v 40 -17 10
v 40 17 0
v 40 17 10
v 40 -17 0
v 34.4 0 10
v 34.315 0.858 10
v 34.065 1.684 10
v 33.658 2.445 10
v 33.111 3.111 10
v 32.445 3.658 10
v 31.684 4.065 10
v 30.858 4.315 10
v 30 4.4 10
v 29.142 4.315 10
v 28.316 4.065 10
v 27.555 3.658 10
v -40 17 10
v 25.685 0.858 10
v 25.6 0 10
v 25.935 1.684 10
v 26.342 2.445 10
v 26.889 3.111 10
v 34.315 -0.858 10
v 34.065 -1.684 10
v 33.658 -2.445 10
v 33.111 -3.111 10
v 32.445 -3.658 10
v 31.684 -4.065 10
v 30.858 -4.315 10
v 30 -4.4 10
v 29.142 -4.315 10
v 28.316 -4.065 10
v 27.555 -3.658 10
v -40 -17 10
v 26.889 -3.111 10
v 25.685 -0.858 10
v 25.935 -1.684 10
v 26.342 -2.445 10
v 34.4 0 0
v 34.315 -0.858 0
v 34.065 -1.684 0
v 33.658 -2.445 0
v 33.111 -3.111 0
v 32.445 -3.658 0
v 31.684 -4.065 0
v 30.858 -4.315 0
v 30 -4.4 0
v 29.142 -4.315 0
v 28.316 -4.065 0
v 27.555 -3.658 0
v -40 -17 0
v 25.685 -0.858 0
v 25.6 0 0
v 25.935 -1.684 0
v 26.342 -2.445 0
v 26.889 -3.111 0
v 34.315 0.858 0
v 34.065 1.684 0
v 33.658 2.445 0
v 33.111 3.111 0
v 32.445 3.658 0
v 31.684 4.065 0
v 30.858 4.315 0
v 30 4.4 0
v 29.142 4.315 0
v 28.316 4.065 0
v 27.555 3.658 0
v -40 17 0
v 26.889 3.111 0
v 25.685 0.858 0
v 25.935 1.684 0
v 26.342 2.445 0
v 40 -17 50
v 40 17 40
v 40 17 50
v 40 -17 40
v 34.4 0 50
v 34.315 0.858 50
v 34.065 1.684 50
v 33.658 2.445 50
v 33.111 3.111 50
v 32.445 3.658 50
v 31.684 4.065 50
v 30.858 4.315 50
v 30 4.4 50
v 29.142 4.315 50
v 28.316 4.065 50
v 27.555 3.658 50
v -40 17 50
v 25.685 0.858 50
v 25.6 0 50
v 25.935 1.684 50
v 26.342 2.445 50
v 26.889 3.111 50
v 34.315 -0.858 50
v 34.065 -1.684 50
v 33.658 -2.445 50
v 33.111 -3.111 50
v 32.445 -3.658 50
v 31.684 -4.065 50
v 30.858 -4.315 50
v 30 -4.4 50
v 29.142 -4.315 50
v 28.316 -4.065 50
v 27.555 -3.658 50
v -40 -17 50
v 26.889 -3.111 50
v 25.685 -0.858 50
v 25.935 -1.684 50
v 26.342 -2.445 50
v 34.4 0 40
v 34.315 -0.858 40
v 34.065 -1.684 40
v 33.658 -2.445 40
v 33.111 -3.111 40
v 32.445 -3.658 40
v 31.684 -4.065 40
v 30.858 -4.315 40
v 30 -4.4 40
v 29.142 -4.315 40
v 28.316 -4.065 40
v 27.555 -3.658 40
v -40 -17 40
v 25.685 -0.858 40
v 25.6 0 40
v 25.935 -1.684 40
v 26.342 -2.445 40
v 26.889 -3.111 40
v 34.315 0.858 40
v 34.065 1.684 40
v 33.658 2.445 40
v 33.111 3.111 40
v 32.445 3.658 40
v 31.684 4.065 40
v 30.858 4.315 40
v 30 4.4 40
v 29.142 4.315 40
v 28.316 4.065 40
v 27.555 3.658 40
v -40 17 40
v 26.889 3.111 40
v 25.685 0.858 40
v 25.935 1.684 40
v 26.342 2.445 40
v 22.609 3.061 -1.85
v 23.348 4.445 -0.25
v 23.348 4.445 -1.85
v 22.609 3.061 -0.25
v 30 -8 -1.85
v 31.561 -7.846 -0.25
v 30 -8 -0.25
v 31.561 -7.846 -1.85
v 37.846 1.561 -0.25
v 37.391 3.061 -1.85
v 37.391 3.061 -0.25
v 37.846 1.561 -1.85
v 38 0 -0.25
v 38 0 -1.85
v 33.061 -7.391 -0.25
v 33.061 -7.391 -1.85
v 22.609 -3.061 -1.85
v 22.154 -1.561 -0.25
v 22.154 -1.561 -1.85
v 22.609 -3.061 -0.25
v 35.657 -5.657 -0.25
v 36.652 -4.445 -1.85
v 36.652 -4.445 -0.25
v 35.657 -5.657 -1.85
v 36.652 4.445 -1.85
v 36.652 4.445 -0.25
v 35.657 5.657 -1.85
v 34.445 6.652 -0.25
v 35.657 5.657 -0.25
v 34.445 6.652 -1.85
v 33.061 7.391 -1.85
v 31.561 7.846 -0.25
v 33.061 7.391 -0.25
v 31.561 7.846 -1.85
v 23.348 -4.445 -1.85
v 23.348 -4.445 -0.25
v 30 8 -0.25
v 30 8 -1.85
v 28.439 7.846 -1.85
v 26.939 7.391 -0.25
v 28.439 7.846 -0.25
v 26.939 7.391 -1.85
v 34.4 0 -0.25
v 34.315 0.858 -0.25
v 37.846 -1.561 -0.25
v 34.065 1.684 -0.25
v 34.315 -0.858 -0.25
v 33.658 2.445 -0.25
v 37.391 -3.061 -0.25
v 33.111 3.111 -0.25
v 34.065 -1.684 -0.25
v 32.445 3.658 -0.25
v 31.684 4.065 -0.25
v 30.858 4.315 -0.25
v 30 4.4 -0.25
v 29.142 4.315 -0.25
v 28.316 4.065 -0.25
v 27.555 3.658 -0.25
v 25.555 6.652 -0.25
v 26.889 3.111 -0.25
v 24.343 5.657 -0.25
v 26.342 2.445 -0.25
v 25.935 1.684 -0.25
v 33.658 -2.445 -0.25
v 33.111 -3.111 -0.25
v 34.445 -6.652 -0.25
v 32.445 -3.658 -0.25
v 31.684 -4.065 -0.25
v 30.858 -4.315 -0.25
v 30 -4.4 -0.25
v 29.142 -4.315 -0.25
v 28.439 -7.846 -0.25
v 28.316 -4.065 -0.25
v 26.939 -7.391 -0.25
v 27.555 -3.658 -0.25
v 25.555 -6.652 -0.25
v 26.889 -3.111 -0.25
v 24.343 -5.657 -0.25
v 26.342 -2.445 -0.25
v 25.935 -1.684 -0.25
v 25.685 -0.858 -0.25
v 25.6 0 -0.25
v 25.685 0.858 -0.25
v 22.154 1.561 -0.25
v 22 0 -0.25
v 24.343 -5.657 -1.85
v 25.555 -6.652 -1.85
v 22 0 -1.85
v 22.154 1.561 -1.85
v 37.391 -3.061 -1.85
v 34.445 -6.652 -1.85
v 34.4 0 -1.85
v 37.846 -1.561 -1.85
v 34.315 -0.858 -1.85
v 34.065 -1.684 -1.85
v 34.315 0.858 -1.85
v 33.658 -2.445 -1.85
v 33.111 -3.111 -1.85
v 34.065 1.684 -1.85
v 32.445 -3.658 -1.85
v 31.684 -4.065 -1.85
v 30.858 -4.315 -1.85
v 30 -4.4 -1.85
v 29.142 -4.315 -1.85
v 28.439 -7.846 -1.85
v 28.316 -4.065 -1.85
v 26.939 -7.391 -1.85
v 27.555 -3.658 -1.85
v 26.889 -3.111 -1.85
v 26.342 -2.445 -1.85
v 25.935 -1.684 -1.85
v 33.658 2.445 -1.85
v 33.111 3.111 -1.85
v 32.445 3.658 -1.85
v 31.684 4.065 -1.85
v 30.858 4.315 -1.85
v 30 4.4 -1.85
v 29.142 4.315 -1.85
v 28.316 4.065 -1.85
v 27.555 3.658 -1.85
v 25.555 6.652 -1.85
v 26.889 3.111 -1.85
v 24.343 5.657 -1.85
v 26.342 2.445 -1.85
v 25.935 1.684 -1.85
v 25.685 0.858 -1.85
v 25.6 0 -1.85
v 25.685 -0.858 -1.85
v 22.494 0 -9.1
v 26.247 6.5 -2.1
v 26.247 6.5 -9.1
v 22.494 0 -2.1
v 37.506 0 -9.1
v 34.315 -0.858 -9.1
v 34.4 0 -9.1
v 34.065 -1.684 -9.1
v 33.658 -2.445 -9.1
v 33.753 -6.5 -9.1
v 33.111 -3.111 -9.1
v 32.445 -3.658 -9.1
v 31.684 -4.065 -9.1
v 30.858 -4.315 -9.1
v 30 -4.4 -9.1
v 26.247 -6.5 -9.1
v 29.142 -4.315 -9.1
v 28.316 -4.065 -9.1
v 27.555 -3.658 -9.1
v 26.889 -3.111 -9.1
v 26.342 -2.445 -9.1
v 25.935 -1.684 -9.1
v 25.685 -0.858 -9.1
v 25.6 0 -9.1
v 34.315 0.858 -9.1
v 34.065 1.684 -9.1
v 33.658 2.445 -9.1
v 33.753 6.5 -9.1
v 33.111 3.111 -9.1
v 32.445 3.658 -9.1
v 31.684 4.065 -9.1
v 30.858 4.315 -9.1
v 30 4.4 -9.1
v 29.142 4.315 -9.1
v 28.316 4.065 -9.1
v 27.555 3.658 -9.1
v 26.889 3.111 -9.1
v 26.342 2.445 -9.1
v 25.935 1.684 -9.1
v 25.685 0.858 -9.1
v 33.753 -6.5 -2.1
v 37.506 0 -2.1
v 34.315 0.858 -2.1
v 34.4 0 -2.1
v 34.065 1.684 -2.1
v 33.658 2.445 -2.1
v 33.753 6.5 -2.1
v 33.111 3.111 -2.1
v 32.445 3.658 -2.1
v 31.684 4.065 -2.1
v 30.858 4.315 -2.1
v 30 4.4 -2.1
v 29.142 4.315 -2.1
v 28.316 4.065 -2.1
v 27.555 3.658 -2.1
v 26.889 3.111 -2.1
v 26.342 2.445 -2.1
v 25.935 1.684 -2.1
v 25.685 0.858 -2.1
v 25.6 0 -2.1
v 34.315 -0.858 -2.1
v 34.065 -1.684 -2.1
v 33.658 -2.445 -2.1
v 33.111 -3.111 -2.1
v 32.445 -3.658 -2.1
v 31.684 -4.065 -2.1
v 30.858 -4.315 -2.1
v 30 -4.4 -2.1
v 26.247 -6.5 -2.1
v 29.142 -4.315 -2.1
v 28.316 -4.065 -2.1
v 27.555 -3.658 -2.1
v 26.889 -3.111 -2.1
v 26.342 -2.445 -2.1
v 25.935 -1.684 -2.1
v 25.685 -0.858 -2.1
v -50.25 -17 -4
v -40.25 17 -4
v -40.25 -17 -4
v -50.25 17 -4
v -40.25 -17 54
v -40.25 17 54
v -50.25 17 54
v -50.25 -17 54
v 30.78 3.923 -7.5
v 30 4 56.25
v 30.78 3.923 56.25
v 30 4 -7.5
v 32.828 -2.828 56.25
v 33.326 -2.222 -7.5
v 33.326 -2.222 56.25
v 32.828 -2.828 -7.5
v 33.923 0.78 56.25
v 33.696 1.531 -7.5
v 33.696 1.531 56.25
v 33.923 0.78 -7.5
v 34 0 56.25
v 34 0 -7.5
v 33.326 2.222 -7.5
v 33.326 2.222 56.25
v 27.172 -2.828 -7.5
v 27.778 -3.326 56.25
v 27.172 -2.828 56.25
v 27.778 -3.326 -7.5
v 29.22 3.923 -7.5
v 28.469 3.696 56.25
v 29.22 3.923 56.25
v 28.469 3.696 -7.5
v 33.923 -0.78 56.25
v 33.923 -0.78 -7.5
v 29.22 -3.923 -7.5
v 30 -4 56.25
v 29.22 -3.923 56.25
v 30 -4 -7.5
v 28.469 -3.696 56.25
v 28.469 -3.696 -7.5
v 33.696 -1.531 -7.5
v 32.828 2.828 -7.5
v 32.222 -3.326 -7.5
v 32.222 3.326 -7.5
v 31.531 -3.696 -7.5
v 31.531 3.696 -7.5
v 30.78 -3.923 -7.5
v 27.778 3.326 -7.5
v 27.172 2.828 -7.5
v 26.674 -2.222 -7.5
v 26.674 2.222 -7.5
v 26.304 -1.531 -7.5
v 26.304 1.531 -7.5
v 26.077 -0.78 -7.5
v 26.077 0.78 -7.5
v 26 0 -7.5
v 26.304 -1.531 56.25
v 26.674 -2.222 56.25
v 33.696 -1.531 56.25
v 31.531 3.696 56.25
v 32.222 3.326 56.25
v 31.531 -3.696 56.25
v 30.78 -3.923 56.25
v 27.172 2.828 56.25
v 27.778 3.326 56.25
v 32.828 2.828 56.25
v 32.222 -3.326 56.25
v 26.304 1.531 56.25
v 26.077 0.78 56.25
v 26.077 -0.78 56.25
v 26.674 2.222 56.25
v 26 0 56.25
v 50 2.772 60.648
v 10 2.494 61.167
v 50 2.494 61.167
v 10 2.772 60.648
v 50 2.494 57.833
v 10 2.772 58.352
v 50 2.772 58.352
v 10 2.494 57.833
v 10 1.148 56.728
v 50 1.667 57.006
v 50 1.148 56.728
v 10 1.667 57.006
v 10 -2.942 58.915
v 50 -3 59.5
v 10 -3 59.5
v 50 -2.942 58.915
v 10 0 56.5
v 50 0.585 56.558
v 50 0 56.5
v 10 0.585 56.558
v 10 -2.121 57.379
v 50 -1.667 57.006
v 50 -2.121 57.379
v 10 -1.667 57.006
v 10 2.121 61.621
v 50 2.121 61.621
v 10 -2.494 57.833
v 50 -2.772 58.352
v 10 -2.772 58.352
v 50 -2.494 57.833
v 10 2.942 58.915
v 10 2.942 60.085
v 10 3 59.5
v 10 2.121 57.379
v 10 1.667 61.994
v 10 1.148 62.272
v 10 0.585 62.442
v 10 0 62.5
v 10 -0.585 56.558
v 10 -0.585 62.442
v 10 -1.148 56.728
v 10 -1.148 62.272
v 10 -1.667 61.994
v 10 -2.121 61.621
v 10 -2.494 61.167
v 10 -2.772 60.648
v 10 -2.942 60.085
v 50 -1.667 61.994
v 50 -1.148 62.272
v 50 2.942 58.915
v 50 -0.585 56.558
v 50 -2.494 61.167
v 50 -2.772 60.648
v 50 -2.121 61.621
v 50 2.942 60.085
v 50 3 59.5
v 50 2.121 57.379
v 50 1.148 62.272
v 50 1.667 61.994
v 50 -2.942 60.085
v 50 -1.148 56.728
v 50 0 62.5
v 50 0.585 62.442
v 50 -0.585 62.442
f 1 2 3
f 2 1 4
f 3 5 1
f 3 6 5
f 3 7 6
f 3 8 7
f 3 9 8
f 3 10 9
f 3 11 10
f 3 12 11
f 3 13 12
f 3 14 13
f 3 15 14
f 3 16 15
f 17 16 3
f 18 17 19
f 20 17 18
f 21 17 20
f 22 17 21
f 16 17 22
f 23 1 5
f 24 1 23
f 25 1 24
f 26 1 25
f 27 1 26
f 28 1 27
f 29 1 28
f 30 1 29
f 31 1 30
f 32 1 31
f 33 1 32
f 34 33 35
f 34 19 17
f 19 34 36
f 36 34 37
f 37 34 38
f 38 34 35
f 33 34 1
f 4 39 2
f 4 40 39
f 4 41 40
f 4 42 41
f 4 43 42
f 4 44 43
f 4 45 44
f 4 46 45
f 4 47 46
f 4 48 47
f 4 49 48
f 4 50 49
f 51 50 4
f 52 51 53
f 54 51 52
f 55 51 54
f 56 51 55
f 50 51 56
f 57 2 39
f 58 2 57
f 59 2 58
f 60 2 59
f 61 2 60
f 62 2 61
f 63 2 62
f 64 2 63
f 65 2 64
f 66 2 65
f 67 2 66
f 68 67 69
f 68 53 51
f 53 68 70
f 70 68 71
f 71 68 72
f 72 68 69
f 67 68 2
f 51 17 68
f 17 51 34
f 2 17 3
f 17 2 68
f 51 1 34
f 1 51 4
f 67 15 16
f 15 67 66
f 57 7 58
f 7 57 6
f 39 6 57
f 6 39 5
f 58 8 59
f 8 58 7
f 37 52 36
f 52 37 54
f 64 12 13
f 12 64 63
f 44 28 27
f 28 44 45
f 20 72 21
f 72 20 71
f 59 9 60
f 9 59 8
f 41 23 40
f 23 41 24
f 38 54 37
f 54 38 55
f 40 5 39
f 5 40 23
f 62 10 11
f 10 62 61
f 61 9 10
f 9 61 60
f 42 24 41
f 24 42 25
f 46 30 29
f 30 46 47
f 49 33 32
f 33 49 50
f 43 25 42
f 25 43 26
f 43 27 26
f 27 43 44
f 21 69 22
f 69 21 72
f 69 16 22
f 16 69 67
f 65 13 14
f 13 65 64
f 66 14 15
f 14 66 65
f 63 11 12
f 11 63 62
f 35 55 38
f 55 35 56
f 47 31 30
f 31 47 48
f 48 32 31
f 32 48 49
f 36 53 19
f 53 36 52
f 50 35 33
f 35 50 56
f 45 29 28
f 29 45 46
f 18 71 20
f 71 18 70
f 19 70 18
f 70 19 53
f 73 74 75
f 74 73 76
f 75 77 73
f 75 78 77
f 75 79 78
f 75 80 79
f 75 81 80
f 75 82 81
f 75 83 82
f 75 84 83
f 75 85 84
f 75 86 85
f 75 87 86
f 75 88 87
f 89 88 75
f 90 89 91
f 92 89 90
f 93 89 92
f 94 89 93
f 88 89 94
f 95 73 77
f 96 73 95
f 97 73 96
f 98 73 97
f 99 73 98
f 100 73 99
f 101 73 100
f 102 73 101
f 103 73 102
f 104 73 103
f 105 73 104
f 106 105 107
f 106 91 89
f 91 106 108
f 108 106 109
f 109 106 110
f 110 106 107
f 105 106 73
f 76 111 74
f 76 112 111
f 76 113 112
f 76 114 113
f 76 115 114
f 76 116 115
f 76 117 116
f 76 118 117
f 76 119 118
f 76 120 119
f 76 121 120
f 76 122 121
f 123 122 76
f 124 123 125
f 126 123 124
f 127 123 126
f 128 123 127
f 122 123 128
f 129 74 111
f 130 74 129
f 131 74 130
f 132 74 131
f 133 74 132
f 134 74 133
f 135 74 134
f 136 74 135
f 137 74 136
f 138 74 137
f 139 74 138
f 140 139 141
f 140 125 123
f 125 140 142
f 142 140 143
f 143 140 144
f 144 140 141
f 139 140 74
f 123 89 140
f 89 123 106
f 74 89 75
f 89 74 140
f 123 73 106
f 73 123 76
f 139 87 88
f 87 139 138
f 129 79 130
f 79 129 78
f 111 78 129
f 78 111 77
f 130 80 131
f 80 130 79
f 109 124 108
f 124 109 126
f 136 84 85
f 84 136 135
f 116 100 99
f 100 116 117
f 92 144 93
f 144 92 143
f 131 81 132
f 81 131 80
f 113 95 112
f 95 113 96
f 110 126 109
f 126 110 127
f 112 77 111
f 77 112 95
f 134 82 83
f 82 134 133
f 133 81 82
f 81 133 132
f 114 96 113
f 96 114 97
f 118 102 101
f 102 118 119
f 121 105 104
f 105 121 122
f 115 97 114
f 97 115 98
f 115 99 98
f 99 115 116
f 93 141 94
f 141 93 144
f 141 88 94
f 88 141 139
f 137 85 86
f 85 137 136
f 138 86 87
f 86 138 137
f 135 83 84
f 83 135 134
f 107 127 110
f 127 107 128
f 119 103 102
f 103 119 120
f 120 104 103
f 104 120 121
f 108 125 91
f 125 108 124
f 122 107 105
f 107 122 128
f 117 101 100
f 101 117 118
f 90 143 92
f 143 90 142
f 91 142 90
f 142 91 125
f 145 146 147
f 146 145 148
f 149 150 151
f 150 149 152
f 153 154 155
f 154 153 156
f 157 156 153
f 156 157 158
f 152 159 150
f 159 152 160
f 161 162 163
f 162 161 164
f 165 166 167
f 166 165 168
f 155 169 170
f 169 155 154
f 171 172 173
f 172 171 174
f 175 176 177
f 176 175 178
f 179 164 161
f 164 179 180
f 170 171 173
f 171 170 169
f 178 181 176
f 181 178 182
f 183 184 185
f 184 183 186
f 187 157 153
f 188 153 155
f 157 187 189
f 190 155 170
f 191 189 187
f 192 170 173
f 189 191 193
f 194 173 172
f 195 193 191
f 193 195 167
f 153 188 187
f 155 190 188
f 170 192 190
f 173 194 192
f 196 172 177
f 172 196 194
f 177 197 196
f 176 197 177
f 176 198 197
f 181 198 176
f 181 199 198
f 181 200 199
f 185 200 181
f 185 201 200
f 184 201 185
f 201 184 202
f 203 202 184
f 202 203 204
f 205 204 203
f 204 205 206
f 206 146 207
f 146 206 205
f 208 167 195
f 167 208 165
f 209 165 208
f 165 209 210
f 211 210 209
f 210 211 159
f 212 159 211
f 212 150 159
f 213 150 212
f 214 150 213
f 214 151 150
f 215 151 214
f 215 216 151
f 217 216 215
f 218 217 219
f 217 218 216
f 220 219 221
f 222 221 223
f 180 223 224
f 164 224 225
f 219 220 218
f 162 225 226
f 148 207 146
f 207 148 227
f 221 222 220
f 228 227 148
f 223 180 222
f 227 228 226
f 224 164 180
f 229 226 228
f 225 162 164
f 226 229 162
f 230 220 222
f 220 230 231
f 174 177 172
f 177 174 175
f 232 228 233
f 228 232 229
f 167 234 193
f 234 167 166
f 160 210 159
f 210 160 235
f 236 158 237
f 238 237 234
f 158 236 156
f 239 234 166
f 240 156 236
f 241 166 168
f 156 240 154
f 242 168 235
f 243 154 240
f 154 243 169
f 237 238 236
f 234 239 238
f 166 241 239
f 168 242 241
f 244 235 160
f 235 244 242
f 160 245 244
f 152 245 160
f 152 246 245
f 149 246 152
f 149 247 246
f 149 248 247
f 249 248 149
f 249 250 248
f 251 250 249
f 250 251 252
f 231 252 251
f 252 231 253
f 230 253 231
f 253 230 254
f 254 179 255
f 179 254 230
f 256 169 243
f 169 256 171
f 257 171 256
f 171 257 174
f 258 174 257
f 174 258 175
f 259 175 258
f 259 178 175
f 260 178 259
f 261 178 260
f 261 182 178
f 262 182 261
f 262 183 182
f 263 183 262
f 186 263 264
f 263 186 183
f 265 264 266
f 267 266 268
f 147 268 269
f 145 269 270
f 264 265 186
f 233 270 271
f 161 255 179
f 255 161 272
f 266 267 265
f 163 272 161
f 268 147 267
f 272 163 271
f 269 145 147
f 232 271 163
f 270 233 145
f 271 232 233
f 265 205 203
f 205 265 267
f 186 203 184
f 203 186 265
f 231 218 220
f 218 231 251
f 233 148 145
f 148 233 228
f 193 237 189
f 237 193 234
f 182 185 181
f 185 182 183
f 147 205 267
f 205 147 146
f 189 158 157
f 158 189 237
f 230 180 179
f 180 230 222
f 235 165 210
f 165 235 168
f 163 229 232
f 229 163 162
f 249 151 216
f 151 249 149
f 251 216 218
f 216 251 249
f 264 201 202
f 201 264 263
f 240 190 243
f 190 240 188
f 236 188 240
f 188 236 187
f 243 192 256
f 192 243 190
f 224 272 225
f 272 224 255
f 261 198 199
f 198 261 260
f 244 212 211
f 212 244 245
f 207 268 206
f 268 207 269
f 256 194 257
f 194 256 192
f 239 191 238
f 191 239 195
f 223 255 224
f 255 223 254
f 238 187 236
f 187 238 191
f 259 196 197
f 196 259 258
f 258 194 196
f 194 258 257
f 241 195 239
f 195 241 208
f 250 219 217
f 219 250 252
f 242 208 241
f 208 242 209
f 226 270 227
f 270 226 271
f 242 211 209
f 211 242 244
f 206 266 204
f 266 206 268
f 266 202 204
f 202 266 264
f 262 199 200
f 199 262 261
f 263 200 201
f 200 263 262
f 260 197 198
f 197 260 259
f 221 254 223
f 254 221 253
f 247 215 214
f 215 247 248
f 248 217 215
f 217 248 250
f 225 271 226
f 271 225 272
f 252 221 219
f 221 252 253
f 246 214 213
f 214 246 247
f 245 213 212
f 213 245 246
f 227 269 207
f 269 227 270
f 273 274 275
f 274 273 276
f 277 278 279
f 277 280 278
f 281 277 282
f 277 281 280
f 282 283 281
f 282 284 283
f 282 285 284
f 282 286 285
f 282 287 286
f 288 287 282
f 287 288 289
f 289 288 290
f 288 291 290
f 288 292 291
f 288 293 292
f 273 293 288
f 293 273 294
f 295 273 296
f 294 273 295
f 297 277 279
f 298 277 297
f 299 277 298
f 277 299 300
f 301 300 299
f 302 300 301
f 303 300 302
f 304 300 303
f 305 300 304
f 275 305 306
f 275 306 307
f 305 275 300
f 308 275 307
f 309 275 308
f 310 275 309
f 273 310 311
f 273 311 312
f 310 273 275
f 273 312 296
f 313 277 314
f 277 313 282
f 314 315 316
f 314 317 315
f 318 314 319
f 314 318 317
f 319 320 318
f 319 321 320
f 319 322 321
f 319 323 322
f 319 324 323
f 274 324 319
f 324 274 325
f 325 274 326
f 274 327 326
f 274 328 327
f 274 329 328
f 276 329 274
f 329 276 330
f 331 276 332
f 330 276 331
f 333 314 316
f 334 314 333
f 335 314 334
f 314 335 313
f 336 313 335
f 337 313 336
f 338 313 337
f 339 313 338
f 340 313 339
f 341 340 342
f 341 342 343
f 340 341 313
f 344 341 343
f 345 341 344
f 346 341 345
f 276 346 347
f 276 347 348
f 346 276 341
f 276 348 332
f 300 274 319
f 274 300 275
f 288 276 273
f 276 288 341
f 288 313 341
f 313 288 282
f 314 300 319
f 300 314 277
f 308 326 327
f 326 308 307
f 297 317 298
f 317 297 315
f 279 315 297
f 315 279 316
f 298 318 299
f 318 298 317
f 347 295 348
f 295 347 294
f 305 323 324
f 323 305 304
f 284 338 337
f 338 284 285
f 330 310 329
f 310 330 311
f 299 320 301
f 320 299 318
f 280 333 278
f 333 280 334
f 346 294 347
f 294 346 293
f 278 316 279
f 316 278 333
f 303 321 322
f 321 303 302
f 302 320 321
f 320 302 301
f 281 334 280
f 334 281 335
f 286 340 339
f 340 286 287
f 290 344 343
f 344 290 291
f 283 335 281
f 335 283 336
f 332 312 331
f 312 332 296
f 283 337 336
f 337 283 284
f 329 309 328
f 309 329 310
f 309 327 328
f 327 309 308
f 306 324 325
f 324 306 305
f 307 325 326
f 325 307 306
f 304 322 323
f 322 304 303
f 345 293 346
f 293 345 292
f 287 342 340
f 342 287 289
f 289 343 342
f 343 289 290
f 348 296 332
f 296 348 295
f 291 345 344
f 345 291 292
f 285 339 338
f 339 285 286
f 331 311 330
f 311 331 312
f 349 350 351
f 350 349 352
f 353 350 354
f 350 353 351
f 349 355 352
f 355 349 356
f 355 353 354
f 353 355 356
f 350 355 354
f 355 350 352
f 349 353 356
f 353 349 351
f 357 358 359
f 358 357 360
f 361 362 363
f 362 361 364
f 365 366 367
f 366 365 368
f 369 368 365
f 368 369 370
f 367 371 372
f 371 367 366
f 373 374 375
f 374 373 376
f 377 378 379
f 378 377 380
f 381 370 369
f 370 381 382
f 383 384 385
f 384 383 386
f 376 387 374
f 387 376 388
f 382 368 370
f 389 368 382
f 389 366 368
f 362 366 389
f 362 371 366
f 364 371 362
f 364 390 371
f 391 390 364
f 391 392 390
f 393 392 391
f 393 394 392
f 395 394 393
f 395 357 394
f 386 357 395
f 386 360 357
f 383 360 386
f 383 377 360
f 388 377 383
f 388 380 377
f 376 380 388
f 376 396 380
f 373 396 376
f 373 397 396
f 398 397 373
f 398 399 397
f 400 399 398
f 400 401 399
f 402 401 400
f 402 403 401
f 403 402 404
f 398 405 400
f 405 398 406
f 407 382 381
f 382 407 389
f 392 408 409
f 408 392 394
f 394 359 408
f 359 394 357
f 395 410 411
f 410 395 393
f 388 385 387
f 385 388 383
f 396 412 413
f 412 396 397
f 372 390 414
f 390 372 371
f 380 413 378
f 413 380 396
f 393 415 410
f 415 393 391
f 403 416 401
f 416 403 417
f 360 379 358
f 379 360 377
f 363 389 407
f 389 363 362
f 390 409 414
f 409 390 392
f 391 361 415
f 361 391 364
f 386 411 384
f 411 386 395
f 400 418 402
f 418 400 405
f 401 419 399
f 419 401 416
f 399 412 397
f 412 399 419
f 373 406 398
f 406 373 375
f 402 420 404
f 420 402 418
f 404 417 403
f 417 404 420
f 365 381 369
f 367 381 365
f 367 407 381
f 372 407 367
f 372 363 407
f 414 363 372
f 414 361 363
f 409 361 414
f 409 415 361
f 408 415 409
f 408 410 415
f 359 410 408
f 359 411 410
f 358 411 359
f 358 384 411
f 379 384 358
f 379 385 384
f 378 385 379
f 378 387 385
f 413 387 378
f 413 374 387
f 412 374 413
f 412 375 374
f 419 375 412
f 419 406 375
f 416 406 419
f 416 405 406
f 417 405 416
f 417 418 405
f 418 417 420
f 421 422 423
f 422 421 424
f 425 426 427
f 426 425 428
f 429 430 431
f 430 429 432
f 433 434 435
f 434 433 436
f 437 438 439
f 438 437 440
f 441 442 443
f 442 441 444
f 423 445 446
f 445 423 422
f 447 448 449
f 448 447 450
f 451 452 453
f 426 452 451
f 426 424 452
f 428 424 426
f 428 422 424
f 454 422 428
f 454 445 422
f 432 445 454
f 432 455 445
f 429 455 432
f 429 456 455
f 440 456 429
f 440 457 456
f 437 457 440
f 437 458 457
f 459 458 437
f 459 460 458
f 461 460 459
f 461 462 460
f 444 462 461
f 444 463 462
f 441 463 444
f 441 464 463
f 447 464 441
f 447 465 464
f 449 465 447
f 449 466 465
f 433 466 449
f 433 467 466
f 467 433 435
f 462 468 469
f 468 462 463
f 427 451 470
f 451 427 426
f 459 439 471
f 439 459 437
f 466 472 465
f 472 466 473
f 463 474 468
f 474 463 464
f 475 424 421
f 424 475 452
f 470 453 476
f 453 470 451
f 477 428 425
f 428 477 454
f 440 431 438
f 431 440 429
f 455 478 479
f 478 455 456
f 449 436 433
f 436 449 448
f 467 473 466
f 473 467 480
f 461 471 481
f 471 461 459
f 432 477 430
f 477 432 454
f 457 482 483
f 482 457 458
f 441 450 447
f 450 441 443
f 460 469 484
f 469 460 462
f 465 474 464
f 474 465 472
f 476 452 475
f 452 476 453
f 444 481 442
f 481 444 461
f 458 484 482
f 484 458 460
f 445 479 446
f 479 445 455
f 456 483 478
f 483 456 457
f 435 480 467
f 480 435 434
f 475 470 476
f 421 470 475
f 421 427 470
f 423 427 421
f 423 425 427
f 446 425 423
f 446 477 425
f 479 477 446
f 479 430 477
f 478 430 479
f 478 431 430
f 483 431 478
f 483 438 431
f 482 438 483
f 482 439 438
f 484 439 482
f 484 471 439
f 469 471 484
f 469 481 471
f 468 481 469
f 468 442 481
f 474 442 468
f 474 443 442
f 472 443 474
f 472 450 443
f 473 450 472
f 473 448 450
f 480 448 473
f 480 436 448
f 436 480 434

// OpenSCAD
$fn = 32;

// ------------------------------------------------------------------------
// C clamp: throat 40 mm, screw d8
// Every part is its own module, assembly() places every instance.
// ------------------------------------------------------------------------

// --- part 1 ---
module clamp_arm() {
  difference() {
    translate([-40, -17, 0]) cube([80, 34, 10]);
    translate([30, 0, -1]) cylinder(h = 12, d = 8.8);
  }
}

// --- part 2 ---
module clamp_spine() {
  difference() {
    translate([-29, -17, 0]) cube([58, 34, 10]);
  }
}

// --- part 3 ---
module clamp_screw() {
  translate([0, 0, -31.875]) cylinder(h = 63.75, d = 8);
}

// --- part 4 ---
module clamp_washer() {
  difference() {
      translate([0, 0, 0]) cylinder(h = 1.6, d = 16);
      translate([0, 0, -1]) cylinder(h = 3.6, d = 8.8);
    }
}

// --- part 5 ---
module clamp_nut() {
  difference() {
    linear_extrude(height = 7) polygon(points = [[7.506, 0], [3.753, 6.5], [-3.753, 6.5], [-7.506, 0], [-3.753, -6.5], [3.753, -6.5]]);
    translate([0, 0, -1]) cylinder(h = 9, d = 8.8);
  }
}

// --- part 6 ---
module tommy_bar() {
  translate([0, 0, -20]) cylinder(h = 40, d = 6);
}

// --- assembly ---
module assembly() {
  color([0.80, 0.24, 0.20]) translate([0, 0, 0]) rotate([0, 0, 0]) clamp_arm();
  color([0.20, 0.45, 0.75]) translate([0, 0, 40]) rotate([0, 0, 0]) clamp_arm();
  color([0.25, 0.62, 0.32]) translate([-50.25, 0, 25]) rotate([0, 90, 0]) clamp_spine();
  color([0.92, 0.70, 0.18]) translate([30, 0, 24.375]) rotate([0, 0, 0]) clamp_screw();
  color([0.58, 0.35, 0.70]) translate([30, 0, -1.85]) rotate([0, 0, 0]) clamp_washer();
  color([0.16, 0.66, 0.66]) translate([30, 0, -9.1]) rotate([0, 0, 0]) clamp_nut();
  color([0.85, 0.48, 0.18]) translate([30, 0, 59.5]) rotate([0, 90, 0]) tommy_bar();
}

assembly();
